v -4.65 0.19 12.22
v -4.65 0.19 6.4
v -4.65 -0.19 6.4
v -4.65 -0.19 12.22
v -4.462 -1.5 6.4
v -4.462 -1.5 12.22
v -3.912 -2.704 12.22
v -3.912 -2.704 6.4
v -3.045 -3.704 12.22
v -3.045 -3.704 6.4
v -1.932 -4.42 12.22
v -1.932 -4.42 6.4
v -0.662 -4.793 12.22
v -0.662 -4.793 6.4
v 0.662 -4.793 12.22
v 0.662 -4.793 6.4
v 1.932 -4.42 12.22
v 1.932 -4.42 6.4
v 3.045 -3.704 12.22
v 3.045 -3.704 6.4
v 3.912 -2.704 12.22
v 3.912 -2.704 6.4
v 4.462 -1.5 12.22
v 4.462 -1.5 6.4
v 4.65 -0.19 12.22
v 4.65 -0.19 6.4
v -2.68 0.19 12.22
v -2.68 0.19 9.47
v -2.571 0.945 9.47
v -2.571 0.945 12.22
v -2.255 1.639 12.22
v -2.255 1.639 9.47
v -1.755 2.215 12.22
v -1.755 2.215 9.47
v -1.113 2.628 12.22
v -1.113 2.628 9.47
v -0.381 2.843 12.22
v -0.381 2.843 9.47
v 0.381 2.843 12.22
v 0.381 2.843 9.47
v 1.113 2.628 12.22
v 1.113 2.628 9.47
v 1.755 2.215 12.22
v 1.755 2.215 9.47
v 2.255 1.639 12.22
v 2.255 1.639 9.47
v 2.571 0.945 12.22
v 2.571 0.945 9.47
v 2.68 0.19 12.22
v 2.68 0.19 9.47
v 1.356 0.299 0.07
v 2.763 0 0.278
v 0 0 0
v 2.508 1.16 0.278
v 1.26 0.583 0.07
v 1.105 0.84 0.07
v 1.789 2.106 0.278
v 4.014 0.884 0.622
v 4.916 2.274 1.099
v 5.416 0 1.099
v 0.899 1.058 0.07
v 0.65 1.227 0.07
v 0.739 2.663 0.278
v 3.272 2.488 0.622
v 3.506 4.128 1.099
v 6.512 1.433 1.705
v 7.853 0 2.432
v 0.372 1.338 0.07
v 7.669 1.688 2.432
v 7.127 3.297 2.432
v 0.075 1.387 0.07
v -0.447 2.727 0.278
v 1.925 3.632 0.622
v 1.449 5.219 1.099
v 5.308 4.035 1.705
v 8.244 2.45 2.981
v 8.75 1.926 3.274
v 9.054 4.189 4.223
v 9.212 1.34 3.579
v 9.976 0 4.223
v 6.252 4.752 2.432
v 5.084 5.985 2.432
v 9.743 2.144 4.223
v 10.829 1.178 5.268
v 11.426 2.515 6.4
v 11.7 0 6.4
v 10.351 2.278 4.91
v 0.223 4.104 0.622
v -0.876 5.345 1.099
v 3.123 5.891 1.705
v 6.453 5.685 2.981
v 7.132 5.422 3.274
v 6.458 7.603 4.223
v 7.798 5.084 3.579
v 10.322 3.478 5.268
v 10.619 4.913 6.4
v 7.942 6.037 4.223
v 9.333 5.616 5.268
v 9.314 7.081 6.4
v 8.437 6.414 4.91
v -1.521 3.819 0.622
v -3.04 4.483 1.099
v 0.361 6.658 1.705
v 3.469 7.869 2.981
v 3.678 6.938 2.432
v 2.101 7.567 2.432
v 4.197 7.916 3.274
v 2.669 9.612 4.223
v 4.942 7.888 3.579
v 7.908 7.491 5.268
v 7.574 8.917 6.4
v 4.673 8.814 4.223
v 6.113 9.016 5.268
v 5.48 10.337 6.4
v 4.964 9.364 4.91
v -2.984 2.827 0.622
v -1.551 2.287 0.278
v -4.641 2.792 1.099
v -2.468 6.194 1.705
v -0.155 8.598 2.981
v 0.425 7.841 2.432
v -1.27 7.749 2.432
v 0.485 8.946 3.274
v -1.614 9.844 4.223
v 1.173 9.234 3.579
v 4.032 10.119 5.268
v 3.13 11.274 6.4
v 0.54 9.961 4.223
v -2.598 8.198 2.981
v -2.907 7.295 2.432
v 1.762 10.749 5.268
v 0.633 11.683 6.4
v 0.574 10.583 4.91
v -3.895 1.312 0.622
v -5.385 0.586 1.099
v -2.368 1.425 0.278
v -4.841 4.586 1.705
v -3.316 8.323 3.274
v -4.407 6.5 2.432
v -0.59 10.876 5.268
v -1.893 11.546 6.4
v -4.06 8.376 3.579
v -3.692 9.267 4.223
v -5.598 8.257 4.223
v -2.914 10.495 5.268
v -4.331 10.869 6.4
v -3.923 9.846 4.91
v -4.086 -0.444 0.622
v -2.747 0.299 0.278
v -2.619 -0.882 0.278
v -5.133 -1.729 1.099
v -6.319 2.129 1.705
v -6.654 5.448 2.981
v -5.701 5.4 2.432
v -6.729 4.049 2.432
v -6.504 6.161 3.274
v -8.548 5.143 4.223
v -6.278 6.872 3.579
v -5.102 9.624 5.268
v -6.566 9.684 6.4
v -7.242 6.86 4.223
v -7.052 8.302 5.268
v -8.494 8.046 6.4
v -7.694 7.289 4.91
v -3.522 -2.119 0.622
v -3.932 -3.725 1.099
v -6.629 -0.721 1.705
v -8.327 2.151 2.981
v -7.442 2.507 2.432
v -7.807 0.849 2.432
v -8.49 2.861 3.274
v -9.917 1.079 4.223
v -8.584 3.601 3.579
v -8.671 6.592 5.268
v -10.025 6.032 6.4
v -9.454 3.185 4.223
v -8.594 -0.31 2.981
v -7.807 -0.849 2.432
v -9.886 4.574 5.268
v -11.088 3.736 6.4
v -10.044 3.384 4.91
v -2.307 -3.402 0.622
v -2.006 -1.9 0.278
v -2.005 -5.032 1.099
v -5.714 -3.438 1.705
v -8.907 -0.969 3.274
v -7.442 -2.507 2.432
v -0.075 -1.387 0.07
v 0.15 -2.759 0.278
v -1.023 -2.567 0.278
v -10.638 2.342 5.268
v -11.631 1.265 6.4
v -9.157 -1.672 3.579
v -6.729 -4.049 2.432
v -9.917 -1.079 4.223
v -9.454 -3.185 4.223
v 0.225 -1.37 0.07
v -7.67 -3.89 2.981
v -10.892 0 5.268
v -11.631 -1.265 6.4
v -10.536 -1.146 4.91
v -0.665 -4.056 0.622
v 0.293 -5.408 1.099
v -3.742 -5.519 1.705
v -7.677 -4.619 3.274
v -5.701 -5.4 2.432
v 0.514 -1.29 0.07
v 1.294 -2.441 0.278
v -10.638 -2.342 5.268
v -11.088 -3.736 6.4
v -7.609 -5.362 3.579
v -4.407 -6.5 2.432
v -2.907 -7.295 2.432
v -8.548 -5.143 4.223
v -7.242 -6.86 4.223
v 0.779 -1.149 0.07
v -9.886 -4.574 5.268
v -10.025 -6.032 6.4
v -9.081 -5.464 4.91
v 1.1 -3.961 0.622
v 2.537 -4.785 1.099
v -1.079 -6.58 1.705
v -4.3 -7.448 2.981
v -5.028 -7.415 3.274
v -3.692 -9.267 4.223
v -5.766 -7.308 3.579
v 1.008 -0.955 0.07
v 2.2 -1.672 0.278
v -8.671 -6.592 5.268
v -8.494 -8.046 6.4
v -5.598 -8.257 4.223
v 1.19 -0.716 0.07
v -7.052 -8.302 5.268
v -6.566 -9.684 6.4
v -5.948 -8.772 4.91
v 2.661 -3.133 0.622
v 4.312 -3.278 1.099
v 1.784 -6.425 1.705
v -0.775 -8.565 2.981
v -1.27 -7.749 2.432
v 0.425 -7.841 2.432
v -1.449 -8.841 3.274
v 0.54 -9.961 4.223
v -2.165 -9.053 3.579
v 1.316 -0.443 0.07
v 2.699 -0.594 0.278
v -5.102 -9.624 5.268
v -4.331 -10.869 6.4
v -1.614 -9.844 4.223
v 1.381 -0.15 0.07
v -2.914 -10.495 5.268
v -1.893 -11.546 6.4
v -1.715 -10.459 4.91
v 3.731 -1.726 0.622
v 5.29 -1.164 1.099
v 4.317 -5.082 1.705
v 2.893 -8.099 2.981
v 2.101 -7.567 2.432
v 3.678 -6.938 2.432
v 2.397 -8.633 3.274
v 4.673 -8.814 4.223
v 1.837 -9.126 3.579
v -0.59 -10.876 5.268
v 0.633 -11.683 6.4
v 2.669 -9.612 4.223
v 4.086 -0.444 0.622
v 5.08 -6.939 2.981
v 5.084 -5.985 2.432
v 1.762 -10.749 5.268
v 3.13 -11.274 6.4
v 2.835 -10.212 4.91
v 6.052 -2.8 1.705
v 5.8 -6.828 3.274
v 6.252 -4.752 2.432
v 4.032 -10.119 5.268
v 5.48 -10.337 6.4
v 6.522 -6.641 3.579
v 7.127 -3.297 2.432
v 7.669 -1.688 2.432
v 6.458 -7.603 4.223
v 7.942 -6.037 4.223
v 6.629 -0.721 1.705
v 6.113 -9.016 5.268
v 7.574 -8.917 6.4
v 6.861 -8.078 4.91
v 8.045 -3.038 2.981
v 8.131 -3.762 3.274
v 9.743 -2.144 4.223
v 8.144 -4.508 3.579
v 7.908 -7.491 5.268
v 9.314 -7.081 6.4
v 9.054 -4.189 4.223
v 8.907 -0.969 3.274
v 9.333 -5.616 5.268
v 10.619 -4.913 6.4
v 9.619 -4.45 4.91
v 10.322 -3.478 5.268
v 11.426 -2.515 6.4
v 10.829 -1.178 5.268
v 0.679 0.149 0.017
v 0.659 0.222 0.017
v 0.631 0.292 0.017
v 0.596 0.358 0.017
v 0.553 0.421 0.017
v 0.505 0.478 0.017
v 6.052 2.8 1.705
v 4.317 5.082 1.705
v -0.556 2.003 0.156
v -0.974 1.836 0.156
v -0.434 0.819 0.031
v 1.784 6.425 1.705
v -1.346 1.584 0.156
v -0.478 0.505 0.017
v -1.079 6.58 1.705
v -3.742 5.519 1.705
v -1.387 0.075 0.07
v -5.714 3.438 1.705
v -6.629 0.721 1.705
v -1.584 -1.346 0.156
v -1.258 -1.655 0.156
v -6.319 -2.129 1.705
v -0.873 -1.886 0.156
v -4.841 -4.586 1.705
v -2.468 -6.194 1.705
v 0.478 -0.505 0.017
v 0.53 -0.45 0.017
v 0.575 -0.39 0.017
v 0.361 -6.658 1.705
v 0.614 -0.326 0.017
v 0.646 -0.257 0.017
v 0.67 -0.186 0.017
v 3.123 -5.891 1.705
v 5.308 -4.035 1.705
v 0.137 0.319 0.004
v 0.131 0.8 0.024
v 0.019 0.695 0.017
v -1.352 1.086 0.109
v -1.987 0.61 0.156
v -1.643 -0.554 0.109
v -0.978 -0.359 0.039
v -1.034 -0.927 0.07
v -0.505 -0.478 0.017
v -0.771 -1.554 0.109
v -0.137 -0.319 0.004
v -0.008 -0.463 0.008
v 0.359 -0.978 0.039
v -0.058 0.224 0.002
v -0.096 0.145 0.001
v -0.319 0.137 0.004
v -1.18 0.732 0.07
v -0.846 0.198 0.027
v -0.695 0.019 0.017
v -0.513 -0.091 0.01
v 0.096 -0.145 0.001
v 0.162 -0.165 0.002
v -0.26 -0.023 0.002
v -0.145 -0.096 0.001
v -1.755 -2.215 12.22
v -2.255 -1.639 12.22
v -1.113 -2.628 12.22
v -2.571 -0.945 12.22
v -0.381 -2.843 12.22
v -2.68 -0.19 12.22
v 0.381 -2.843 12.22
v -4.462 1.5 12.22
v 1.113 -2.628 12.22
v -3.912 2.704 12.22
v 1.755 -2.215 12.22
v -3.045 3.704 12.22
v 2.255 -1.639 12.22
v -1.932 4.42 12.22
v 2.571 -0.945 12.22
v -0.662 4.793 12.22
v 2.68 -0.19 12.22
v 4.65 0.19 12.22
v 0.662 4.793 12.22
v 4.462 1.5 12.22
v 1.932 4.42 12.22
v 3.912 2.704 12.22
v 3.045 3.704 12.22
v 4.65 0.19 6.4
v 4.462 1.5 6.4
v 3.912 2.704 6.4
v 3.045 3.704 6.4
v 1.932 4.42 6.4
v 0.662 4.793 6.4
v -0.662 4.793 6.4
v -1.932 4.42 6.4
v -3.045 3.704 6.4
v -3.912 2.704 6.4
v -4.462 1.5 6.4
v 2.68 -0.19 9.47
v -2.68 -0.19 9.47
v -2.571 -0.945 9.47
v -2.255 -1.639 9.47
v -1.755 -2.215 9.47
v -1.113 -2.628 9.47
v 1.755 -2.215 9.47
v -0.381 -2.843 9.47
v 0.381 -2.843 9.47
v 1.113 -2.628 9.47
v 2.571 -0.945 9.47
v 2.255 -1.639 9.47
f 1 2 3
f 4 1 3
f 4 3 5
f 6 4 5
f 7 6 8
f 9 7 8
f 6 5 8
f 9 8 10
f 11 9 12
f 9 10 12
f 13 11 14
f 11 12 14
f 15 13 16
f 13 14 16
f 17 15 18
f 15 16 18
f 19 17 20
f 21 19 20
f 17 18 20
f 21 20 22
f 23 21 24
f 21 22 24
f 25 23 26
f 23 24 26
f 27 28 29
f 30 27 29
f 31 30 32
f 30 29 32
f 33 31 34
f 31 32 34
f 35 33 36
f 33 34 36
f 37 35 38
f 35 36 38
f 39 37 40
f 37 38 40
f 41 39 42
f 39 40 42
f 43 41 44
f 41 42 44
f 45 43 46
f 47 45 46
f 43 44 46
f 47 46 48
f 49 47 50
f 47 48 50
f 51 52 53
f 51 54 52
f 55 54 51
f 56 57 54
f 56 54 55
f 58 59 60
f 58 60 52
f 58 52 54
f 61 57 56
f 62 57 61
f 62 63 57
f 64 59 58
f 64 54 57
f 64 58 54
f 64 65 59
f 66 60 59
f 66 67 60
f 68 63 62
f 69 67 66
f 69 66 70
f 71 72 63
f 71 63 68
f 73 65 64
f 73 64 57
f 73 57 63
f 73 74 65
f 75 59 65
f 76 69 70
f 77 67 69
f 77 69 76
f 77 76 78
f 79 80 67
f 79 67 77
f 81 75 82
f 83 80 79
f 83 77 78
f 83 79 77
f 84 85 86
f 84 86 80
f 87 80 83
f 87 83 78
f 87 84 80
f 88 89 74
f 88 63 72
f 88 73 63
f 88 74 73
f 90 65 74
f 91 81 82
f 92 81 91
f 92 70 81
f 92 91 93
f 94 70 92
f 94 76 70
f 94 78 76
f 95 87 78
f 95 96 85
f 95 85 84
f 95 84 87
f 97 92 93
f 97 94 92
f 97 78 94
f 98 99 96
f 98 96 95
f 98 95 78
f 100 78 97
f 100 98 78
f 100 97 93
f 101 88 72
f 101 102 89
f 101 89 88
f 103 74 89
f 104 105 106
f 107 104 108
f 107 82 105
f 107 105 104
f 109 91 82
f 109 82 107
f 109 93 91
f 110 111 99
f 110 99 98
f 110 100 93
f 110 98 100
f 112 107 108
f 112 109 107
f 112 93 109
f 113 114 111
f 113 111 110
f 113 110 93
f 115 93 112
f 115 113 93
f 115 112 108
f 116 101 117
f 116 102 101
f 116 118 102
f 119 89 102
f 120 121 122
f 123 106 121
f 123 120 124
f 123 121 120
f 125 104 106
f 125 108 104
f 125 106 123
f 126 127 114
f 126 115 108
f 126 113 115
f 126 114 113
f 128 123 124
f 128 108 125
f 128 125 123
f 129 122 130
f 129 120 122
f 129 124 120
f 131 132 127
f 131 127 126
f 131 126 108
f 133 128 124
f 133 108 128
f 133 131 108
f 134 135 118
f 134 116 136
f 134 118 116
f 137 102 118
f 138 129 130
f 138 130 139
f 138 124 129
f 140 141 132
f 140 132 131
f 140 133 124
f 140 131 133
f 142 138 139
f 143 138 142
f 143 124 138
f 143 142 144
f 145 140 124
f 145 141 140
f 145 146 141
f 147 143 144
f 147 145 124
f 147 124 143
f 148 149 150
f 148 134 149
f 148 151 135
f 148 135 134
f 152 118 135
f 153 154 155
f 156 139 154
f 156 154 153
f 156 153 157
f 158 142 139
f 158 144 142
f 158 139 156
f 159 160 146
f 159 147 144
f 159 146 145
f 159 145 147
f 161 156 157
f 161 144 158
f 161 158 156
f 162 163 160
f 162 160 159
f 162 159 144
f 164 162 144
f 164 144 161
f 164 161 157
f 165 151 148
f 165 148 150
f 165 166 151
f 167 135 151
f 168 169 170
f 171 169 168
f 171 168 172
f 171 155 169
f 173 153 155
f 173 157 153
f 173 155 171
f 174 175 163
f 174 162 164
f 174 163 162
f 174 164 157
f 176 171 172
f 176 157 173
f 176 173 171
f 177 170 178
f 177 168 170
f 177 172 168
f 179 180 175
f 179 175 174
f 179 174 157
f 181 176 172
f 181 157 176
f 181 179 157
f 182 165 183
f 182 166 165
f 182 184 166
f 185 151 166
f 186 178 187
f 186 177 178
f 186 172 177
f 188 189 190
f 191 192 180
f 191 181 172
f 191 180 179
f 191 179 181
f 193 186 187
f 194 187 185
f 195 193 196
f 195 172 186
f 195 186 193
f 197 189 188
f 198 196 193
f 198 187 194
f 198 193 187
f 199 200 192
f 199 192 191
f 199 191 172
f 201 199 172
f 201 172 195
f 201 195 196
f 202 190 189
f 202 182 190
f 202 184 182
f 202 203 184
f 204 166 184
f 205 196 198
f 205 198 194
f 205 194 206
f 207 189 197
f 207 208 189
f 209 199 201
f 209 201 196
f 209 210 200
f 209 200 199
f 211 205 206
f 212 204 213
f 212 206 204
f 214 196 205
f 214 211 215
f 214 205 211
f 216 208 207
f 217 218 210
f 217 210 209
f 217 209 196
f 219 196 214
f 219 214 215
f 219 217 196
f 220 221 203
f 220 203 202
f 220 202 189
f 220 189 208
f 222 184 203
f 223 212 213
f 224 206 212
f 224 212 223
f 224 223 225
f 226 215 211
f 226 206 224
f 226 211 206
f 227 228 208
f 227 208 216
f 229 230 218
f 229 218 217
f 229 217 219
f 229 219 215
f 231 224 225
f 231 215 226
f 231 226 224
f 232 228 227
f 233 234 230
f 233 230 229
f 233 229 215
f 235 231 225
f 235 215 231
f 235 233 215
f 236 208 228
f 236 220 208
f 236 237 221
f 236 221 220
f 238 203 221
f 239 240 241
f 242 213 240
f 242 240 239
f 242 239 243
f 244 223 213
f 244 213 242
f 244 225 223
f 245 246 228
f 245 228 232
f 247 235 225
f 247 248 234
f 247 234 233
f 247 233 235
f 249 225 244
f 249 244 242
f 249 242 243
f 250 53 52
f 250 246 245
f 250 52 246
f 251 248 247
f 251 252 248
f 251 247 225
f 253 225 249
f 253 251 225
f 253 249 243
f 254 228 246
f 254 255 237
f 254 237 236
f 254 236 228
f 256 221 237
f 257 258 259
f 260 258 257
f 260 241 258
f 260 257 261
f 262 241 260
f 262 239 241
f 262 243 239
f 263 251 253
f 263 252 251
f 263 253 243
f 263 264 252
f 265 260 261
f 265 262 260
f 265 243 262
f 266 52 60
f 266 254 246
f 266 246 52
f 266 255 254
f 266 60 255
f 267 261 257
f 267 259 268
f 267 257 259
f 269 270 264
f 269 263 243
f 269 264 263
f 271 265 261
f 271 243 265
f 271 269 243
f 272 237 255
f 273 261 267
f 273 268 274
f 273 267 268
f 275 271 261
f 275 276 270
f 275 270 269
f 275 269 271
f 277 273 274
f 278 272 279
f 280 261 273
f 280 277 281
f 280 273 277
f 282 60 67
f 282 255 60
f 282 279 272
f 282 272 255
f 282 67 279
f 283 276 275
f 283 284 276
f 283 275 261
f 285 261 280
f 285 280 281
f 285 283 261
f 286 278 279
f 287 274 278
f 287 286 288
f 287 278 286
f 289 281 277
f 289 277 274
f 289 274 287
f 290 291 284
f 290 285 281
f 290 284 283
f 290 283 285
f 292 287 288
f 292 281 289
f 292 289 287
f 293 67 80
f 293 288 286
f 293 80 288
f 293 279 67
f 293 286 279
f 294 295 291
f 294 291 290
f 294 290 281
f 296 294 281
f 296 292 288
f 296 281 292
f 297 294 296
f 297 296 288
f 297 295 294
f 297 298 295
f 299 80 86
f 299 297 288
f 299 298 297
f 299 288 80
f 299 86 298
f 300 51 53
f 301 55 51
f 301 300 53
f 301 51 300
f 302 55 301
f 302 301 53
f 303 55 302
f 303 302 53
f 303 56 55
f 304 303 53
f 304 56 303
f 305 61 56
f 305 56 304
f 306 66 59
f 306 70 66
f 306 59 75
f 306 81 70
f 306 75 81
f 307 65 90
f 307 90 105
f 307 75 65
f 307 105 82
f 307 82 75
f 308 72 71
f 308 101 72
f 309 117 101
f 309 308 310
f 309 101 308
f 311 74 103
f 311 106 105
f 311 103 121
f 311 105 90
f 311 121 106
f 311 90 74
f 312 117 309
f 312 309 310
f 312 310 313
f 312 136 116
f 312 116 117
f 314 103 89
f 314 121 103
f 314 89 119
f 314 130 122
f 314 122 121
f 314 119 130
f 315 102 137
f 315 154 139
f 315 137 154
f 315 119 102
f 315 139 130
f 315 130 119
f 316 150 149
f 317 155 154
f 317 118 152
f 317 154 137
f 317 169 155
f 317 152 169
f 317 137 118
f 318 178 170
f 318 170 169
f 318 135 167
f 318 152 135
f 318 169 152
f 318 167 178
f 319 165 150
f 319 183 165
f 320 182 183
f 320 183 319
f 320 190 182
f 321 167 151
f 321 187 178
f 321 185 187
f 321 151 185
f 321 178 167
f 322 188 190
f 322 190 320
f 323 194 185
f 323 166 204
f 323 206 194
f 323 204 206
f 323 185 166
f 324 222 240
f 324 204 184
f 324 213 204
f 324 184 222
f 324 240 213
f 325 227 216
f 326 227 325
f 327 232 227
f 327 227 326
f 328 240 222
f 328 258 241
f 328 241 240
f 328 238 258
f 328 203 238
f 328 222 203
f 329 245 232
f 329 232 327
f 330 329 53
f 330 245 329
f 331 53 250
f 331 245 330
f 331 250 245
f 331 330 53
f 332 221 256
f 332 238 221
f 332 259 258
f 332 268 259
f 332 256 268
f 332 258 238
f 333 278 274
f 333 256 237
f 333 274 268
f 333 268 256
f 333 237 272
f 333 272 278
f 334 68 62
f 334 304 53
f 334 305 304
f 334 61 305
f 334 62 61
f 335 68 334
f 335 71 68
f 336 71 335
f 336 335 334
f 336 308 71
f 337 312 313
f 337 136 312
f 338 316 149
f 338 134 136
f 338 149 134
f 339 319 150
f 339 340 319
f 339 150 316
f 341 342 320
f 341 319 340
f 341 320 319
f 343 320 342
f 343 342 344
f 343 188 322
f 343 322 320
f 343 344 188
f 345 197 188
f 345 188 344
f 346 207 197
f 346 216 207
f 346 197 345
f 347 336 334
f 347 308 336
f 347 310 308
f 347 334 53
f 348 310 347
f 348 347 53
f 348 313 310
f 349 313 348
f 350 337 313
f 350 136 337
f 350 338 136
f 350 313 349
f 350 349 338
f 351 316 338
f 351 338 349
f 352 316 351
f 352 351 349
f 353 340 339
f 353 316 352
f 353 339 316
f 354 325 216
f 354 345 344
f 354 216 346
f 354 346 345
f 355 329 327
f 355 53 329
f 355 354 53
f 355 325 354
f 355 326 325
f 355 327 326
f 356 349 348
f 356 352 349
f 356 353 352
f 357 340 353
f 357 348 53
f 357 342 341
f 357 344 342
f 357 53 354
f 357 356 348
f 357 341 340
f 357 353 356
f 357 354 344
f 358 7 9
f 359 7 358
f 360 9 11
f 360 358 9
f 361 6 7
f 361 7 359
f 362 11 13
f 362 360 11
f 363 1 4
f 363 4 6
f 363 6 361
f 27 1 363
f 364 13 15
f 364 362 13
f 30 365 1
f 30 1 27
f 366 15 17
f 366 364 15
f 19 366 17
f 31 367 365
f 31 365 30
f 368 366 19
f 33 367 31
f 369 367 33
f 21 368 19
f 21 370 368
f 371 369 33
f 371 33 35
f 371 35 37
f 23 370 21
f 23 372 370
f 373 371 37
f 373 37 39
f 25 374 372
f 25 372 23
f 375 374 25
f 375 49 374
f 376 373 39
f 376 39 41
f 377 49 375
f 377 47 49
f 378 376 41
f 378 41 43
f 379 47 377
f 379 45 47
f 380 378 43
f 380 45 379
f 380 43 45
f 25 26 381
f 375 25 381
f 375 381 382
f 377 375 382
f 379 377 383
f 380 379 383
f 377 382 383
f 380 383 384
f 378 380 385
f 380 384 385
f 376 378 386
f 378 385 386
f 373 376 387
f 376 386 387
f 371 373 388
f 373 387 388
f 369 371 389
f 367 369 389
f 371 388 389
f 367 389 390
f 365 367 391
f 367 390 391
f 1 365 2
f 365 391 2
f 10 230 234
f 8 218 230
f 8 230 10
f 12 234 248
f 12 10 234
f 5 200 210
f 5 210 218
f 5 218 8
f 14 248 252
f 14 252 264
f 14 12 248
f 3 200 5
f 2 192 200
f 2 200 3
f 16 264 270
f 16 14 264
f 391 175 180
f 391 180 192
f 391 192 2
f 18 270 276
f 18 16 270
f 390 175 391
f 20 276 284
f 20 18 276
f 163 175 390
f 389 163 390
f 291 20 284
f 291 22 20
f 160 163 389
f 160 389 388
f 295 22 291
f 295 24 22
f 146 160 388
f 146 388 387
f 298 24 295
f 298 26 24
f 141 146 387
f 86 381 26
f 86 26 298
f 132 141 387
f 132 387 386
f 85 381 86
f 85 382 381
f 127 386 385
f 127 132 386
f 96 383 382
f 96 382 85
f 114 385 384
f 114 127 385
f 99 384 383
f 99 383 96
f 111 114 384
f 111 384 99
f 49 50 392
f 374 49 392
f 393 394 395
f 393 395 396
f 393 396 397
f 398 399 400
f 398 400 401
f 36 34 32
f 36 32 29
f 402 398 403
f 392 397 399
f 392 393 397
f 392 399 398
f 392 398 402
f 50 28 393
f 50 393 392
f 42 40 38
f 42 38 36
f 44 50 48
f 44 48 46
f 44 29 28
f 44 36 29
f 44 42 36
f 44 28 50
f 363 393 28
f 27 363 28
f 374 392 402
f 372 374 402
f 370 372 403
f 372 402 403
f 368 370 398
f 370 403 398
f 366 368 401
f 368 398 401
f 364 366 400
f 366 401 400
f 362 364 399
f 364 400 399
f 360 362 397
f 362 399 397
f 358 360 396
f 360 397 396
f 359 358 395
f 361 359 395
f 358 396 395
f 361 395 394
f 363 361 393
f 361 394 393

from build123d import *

# Parameters (mm, degrees)
F3_DEPTH = 5.82
F5_DEPTH = 7.75
F6_DEPTH = 5


with BuildPart() as f1:
    # F0 (on Front) → F1 (revolve)
    with BuildSketch(Plane.XZ):
        with BuildLine():
            Line((0, 6.4), (0, 0))
            ThreePointArc((0, 0), (6.668021, 1.704556), (11.7, 6.4))
            Line((11.7, 6.4), (0, 6.4))
        make_face()
    revolve(axis=Axis((0, 0, 3.2), (0, 0, 1)))

    # F2 (on face) → F3 (join)
    with BuildSketch(Plane.XY.offset(6.4)):
        with BuildLine():
            Line((4.65, -0.19), (4.65, 0.19))
            ThreePointArc((4.65, 0.19), (0, 4.84), (-4.65, 0.19))
            Line((-4.65, 0.19), (-4.65, -0.19))
            ThreePointArc((-4.65, -0.19), (0, -4.84), (4.65, -0.19))
        make_face()
        with BuildLine():
            Line((-2.68, -0.19), (-2.68, 0.19))
            ThreePointArc((-2.68, 0.19), (0, 2.87), (2.68, 0.19))
            Line((2.68, 0.19), (2.68, -0.19))
            ThreePointArc((2.68, -0.19), (0, -2.87), (-2.68, -0.19))
        make_face(mode=Mode.SUBTRACT)
    extrude(amount=F3_DEPTH)

    # F4 (on face) → F5 (cut)
    with BuildSketch(Plane.XY.offset(12.22)):
        with BuildLine():
            ThreePointArc((2.68, 0.19), (0, 2.87), (-2.68, 0.19))
            Line((-2.68, 0.19), (-2.68, -0.19))
            ThreePointArc((-2.68, -0.19), (0, -2.87), (2.68, -0.19))
            Line((2.68, -0.19), (2.68, 0.19))
        make_face()
    extrude(amount=-F5_DEPTH, mode=Mode.SUBTRACT)

    # F5_face (on face) → F6 (join)
    with BuildSketch(Plane.XY.offset(4.47)):
        with BuildLine():
            ThreePointArc((2.68, 0.19), (0, 2.87), (-2.68, 0.19))
            Line((-2.68, 0.19), (-2.68, -0.19))
            ThreePointArc((-2.68, -0.19), (0, -2.87), (2.68, -0.19))
            Line((2.68, -0.19), (2.68, 0.19))
        make_face()
    extrude(amount=F6_DEPTH)


solid = f1.part
